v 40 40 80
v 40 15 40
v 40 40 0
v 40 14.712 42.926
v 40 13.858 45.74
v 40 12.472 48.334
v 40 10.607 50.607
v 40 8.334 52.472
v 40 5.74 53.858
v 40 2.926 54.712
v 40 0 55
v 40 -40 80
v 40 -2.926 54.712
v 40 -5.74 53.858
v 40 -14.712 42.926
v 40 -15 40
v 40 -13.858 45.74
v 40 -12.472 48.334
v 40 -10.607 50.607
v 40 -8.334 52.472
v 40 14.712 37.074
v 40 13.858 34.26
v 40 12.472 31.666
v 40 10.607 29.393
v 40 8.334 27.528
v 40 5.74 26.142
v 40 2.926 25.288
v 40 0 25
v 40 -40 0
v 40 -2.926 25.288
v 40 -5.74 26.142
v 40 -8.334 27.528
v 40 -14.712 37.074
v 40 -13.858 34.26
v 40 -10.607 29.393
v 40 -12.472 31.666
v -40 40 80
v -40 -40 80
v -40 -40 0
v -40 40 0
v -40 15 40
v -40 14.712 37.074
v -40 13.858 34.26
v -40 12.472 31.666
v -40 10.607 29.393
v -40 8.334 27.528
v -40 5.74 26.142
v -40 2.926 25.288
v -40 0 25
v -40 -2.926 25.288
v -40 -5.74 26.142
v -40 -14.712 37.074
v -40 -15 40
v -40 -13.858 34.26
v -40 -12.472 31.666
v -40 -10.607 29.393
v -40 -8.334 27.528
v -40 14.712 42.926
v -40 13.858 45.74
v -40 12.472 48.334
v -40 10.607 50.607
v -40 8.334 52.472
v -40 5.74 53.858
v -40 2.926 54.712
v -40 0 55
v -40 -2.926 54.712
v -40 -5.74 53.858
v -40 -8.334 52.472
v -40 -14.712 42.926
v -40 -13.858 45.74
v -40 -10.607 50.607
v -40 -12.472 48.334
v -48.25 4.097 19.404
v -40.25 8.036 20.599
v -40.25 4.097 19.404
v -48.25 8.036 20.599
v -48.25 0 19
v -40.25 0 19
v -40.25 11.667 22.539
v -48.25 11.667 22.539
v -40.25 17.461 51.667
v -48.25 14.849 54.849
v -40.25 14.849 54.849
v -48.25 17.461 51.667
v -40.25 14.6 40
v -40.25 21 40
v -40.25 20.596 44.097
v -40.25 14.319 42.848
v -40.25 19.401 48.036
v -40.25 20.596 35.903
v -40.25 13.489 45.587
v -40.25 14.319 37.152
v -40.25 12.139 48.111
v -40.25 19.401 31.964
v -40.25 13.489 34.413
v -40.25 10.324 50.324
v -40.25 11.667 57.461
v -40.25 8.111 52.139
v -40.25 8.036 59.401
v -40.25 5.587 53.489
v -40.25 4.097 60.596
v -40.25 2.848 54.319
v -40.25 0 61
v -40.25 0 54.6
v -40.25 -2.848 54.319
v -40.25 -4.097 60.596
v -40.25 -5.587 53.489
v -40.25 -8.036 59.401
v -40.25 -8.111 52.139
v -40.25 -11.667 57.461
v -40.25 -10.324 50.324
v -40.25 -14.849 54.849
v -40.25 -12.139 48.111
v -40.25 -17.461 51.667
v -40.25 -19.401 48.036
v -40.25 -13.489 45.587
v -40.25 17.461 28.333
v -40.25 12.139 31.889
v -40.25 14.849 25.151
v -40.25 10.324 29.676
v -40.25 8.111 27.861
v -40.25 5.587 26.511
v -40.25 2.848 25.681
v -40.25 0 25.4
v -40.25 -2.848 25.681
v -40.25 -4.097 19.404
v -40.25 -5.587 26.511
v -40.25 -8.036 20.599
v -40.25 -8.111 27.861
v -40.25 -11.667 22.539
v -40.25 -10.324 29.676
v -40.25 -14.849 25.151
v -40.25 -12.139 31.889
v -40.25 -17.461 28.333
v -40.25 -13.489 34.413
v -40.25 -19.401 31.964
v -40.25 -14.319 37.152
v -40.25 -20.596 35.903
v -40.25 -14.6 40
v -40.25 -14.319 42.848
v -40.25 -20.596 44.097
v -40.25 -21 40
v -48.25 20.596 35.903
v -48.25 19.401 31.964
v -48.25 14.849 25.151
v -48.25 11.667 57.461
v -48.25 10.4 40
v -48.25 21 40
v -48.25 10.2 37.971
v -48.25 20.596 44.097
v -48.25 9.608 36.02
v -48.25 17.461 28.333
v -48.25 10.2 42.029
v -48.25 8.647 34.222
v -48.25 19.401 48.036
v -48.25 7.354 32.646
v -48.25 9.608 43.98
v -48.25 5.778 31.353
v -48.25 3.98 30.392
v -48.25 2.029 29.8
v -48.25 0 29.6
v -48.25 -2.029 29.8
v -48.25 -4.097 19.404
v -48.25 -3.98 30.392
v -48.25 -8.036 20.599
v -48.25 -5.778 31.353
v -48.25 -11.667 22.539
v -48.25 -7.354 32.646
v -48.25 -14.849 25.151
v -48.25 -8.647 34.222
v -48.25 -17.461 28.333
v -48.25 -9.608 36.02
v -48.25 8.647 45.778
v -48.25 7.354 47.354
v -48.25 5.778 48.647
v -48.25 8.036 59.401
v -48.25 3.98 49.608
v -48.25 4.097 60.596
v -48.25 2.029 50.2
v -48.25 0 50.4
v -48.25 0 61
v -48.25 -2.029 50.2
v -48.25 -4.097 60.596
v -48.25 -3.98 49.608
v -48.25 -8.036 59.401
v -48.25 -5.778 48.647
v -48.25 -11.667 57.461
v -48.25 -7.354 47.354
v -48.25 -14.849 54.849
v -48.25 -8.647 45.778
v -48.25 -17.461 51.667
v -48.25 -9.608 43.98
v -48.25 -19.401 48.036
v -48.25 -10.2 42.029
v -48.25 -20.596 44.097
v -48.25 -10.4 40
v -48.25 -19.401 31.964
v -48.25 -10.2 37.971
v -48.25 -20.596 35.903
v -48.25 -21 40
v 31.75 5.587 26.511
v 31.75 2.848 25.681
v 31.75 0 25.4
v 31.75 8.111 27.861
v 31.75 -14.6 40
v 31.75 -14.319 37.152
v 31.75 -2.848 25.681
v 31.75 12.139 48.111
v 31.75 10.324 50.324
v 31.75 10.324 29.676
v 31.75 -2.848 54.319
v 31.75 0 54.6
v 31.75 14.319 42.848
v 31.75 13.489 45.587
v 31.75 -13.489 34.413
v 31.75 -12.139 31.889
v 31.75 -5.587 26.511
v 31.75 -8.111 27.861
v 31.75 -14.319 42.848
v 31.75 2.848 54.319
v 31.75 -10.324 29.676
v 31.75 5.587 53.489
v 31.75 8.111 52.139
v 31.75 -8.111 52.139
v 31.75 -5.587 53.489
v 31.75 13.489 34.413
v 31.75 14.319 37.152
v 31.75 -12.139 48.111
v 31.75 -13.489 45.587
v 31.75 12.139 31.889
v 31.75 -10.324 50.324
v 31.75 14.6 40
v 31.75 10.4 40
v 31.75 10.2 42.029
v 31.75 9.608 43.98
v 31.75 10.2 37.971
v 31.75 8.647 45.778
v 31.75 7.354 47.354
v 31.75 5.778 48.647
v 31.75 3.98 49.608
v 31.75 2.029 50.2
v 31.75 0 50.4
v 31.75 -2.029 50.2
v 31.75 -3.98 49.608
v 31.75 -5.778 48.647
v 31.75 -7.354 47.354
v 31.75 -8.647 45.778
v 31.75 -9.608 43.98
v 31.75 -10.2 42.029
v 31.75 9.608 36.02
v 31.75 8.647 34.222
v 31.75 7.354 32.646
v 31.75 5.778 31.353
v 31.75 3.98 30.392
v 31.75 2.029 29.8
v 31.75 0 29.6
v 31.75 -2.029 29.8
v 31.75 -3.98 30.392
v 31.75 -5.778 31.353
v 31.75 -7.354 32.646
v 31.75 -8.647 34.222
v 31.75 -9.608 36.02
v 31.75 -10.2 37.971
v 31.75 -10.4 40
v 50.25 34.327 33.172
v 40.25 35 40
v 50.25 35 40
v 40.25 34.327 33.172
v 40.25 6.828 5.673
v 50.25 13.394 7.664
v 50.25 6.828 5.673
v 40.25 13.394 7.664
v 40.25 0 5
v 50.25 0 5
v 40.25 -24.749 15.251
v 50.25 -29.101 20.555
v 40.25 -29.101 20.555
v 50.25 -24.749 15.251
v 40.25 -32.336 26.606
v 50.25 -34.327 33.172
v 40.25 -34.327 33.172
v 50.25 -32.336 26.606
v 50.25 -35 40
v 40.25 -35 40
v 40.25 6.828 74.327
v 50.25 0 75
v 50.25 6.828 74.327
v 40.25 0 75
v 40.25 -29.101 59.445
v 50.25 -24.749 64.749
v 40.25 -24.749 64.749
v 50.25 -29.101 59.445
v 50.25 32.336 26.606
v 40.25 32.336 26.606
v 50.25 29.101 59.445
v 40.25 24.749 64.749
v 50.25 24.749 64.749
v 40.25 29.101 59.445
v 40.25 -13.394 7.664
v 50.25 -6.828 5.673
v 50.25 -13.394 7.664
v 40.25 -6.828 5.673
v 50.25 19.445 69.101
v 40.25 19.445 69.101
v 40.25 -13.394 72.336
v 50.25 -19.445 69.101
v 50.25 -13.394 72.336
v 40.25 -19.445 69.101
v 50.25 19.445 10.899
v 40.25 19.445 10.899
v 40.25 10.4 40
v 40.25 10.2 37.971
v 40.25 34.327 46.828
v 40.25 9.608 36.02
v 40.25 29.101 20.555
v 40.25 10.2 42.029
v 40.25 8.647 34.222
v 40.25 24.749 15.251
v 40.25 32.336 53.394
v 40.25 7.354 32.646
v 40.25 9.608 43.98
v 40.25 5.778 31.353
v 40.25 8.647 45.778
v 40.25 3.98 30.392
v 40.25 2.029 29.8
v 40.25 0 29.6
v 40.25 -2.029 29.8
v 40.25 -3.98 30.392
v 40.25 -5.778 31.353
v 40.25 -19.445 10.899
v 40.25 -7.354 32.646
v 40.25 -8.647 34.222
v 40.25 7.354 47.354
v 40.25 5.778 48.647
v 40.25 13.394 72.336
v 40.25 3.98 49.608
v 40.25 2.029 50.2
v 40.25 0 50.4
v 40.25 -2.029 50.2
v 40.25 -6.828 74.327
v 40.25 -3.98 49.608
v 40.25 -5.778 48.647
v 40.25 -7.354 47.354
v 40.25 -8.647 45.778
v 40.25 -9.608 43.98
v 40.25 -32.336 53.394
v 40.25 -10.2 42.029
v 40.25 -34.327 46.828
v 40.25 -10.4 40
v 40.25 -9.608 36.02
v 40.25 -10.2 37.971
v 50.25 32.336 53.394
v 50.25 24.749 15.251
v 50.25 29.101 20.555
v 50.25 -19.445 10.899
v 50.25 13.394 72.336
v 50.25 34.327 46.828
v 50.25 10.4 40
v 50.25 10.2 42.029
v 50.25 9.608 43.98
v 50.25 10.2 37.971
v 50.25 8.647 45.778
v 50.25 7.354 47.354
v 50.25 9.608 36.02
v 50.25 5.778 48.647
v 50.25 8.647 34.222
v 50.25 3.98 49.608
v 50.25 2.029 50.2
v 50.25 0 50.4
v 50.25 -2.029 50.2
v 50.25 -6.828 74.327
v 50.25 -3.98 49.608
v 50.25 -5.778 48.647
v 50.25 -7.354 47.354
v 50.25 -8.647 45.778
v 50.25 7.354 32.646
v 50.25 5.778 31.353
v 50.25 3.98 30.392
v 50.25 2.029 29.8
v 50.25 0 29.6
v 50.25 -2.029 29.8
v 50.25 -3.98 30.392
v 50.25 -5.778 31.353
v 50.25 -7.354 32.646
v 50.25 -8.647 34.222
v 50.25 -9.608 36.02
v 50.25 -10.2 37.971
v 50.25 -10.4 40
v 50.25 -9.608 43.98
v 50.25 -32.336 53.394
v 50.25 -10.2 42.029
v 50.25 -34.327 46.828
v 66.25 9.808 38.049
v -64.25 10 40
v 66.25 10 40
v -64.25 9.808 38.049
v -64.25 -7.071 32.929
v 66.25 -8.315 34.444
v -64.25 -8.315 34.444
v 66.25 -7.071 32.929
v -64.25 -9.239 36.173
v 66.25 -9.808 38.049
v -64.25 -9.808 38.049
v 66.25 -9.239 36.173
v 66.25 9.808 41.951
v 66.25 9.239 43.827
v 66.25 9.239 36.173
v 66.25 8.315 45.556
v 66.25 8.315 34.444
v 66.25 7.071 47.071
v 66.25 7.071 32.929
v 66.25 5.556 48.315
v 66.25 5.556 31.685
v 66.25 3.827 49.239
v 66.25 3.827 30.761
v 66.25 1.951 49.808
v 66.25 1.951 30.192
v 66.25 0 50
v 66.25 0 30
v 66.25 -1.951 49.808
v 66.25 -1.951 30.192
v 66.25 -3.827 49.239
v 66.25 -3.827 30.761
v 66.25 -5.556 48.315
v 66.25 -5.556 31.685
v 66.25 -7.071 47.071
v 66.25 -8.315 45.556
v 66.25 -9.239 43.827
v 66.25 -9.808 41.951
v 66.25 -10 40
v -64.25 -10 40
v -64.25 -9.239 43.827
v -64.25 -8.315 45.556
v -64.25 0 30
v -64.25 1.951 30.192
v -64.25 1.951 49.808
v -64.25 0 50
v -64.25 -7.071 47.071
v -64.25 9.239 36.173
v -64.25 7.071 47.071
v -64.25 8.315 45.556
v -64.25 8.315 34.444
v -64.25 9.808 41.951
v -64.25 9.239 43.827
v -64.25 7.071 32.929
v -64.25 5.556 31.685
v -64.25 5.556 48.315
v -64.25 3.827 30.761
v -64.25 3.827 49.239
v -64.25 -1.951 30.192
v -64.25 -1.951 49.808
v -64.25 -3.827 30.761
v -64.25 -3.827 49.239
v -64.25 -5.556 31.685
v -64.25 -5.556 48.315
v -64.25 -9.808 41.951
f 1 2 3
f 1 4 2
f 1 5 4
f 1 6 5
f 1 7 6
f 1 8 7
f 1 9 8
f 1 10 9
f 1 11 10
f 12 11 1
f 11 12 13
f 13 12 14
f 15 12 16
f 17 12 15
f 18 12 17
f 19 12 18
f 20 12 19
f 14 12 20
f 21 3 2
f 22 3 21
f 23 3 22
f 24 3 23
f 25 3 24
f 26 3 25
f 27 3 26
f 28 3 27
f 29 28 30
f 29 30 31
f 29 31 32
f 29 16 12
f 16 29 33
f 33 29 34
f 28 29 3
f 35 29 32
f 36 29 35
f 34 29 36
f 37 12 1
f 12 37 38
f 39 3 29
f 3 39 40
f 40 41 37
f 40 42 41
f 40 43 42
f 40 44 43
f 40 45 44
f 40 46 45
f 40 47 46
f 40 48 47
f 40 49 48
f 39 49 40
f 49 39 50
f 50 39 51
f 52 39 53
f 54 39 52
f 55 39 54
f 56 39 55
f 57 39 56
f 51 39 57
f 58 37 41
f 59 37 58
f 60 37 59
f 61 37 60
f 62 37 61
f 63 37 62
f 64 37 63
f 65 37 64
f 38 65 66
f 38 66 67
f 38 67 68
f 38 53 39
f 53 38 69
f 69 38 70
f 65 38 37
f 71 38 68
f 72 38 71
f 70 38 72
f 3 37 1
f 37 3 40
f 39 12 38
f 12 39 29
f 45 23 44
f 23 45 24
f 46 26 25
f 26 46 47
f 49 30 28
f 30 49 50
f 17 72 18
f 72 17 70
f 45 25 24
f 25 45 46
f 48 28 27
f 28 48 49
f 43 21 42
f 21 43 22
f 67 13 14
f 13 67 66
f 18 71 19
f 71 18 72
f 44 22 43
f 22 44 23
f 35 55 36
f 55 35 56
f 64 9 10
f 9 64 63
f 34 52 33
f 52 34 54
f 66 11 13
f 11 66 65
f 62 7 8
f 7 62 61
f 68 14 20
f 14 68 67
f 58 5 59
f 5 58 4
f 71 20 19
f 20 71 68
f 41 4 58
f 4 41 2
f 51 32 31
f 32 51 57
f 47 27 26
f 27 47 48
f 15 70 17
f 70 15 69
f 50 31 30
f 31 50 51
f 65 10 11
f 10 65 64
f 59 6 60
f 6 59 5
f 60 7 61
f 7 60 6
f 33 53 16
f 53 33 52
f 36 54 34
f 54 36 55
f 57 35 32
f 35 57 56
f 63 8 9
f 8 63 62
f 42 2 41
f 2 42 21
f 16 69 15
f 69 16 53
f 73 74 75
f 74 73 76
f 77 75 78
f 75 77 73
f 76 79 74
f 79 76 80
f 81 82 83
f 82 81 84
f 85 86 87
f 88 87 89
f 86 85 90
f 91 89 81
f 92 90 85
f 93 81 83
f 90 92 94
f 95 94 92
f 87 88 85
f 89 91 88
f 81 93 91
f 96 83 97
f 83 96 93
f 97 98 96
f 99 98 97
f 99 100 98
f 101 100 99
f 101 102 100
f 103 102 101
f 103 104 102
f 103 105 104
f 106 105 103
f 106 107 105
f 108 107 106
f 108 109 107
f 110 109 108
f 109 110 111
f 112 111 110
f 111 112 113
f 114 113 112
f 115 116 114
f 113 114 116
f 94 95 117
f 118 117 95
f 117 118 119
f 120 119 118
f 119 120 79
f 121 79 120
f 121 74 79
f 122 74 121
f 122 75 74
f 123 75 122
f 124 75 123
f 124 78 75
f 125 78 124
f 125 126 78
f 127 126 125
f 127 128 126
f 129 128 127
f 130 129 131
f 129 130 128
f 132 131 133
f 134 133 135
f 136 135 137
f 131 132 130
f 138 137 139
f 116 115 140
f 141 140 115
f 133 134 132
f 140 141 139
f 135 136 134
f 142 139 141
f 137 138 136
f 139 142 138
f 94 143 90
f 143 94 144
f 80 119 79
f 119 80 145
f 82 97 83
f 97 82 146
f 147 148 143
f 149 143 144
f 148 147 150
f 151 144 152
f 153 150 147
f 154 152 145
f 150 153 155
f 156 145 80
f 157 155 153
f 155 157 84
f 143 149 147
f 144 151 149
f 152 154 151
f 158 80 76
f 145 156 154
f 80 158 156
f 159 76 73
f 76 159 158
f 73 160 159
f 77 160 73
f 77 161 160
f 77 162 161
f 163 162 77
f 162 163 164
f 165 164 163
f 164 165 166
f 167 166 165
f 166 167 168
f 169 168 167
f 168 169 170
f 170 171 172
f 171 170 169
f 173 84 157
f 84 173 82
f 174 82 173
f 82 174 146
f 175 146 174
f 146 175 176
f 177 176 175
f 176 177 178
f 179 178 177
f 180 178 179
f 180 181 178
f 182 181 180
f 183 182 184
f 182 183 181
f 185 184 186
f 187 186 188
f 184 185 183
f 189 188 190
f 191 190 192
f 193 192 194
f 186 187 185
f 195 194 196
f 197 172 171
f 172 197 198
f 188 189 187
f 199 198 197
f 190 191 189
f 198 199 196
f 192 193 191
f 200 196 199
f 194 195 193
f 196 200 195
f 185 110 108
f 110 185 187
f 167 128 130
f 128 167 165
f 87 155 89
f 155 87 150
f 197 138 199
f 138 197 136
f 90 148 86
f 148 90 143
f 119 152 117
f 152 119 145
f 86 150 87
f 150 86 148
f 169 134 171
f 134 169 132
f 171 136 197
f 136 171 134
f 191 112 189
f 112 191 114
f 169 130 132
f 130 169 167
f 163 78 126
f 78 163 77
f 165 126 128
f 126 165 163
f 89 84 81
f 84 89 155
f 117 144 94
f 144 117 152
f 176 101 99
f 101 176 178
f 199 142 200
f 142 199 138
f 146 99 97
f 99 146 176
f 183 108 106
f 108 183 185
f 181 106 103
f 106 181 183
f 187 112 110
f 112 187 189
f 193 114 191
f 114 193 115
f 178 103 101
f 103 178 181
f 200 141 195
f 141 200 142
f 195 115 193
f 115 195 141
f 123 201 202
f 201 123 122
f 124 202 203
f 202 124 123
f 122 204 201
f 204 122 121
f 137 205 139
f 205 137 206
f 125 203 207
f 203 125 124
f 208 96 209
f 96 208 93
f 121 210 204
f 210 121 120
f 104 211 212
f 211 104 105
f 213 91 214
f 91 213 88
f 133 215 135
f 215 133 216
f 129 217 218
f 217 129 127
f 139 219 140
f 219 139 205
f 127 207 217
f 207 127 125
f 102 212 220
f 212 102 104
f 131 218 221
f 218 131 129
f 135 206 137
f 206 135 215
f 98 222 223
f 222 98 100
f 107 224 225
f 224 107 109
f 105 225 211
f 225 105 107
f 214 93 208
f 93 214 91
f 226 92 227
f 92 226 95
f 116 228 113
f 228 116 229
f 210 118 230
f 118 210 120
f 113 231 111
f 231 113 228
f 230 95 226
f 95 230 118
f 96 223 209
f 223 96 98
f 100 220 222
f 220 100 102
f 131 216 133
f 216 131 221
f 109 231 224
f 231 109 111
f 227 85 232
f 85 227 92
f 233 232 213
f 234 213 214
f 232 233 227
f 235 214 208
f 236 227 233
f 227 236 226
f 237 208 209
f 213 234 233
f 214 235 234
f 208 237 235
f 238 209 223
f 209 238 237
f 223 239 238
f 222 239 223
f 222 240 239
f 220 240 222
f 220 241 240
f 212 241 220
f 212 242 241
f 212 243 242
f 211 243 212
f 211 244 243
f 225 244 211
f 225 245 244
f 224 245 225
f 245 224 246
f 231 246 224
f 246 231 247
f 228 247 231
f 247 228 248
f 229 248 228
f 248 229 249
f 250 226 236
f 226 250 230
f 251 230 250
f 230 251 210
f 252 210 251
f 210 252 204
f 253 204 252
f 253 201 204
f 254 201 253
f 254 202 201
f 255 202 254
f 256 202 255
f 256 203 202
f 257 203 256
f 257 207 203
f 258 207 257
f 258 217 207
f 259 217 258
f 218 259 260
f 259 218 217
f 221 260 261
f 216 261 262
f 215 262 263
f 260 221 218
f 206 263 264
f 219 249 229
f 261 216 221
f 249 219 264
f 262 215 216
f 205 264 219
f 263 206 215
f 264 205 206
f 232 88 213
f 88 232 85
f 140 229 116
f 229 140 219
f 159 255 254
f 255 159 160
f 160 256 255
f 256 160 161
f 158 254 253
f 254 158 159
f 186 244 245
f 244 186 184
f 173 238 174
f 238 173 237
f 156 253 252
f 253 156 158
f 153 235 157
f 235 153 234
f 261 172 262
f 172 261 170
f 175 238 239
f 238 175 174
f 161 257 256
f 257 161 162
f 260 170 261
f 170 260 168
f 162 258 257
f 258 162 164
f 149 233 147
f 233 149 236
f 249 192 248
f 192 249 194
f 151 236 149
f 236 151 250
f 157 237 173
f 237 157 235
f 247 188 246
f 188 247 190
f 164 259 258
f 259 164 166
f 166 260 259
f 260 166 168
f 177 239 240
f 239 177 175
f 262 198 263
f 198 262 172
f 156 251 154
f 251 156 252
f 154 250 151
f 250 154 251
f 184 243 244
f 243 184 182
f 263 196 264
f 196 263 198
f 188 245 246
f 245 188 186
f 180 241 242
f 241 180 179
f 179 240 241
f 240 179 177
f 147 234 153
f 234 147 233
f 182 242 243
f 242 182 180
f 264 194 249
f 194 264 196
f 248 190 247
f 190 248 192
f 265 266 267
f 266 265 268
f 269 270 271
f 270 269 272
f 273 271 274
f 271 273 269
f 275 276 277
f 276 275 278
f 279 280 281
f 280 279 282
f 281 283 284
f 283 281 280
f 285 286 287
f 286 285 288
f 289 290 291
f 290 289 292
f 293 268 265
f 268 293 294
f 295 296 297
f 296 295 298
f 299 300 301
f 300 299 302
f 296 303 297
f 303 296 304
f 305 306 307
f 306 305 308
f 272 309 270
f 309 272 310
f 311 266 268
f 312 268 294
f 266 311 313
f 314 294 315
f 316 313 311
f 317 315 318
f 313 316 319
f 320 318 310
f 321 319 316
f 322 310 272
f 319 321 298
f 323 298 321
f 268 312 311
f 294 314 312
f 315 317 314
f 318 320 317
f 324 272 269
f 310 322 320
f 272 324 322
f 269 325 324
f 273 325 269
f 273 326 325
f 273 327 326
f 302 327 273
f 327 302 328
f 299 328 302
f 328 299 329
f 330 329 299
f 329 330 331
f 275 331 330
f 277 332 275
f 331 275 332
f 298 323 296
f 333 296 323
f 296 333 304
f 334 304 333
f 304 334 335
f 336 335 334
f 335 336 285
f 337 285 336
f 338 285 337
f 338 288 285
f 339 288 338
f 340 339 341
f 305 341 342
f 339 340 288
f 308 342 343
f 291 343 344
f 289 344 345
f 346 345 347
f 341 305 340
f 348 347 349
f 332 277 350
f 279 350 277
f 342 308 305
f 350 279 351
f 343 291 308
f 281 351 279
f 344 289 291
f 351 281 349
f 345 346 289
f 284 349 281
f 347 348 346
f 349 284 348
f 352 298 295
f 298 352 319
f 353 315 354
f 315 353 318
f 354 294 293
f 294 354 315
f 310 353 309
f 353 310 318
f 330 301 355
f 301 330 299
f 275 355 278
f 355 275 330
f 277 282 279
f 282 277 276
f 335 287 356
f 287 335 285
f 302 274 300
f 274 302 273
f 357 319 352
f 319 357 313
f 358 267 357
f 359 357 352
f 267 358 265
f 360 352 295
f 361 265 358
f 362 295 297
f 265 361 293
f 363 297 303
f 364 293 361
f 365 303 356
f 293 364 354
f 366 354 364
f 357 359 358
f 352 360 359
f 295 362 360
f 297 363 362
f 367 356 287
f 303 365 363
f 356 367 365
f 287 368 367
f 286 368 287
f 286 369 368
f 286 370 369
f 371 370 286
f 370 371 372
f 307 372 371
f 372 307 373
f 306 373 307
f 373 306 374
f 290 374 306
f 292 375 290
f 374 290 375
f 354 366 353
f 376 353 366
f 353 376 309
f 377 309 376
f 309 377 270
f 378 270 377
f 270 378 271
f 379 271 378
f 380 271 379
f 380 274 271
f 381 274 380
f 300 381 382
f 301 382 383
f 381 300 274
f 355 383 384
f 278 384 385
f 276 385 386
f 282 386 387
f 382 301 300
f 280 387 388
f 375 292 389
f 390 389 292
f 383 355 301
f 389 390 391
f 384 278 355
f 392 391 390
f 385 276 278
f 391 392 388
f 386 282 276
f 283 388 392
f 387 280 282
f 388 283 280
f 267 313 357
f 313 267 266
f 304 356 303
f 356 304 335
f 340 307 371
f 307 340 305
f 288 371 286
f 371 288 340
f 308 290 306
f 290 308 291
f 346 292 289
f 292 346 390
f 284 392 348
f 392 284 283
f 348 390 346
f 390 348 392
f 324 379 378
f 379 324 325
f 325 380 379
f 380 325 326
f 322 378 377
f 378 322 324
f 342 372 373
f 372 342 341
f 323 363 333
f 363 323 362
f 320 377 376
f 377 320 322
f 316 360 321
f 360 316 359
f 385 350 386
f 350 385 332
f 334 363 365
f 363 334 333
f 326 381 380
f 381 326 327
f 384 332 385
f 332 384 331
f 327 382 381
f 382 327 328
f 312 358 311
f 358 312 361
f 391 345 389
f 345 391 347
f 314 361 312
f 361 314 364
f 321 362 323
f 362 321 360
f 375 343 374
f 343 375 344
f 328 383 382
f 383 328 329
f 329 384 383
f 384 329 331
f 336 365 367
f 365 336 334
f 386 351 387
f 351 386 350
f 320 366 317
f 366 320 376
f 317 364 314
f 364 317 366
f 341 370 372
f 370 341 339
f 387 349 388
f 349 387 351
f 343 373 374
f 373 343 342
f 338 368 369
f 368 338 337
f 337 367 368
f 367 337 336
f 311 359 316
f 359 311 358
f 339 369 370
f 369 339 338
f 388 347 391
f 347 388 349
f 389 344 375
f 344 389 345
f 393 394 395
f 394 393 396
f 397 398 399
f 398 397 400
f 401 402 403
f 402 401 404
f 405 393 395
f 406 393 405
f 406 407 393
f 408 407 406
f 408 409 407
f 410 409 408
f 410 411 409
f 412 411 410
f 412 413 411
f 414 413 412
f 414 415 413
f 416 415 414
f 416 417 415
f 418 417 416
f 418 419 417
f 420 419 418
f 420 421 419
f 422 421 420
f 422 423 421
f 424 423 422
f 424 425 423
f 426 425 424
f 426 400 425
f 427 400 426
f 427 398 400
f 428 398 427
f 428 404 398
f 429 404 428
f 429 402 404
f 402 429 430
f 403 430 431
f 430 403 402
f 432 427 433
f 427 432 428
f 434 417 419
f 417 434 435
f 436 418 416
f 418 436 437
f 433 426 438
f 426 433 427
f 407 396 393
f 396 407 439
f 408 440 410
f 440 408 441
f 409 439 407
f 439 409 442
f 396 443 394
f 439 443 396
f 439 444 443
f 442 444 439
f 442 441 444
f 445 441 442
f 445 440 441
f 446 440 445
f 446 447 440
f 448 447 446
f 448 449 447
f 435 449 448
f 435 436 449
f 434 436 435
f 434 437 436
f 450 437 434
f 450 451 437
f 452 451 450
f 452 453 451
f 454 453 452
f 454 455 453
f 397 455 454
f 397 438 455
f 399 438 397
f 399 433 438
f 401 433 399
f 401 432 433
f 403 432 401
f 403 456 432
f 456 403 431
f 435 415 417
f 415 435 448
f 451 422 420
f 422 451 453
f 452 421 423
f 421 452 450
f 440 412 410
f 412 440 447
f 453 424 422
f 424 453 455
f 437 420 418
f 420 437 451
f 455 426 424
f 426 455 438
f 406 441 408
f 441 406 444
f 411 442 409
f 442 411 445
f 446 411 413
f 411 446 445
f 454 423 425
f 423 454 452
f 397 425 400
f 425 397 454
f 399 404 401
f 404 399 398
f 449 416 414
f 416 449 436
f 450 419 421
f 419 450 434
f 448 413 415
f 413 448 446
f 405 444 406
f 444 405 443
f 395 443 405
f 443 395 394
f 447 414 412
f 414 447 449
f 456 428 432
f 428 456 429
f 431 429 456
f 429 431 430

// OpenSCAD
$fn = 32;

// ------------------------------------------------------------------------
// Bushed housing: 80 x 80 x 80 mm housing, bushing d29.2
// Every part is its own module, assembly() places them once.
// ------------------------------------------------------------------------

// --- part 1 ---
module housing() {
  difference() {
    translate([-40, -40, 0]) cube([80, 80, 80]);
    translate([0, 0, 40]) rotate([0, 90, 0]) cylinder(h = 82, d = 30, center = true);
  }
}

// --- part 2 ---
module bushing() {
  difference() {
    union() {
      cylinder(h = 8, d = 42);
      translate([0, 0, 8]) cylinder(h = 72, d = 29.2);
    }
    translate([0, 0, -1]) cylinder(h = 82, d = 20.8);
  }
}

// --- part 3 ---
module shaft() {
  translate([0, 0, -65.25]) cylinder(h = 130.5, d = 20);
}

// --- part 4 ---
module cover() {
  difference() {
    cylinder(h = 10, d = 70);
    translate([0, 0, -1]) cylinder(h = 12, d = 20.8);
  }
}

// --- assembly ---
module assembly() {
  translate([0, 0, 0]) rotate([0, 0, 0]) housing();
  translate([-48.25, 0, 40]) rotate([0, 90, 0]) bushing();
  translate([1, 0, 40]) rotate([0, 90, 0]) shaft();
  translate([40.25, 0, 40]) rotate([0, 90, 0]) cover();
}

assembly();
